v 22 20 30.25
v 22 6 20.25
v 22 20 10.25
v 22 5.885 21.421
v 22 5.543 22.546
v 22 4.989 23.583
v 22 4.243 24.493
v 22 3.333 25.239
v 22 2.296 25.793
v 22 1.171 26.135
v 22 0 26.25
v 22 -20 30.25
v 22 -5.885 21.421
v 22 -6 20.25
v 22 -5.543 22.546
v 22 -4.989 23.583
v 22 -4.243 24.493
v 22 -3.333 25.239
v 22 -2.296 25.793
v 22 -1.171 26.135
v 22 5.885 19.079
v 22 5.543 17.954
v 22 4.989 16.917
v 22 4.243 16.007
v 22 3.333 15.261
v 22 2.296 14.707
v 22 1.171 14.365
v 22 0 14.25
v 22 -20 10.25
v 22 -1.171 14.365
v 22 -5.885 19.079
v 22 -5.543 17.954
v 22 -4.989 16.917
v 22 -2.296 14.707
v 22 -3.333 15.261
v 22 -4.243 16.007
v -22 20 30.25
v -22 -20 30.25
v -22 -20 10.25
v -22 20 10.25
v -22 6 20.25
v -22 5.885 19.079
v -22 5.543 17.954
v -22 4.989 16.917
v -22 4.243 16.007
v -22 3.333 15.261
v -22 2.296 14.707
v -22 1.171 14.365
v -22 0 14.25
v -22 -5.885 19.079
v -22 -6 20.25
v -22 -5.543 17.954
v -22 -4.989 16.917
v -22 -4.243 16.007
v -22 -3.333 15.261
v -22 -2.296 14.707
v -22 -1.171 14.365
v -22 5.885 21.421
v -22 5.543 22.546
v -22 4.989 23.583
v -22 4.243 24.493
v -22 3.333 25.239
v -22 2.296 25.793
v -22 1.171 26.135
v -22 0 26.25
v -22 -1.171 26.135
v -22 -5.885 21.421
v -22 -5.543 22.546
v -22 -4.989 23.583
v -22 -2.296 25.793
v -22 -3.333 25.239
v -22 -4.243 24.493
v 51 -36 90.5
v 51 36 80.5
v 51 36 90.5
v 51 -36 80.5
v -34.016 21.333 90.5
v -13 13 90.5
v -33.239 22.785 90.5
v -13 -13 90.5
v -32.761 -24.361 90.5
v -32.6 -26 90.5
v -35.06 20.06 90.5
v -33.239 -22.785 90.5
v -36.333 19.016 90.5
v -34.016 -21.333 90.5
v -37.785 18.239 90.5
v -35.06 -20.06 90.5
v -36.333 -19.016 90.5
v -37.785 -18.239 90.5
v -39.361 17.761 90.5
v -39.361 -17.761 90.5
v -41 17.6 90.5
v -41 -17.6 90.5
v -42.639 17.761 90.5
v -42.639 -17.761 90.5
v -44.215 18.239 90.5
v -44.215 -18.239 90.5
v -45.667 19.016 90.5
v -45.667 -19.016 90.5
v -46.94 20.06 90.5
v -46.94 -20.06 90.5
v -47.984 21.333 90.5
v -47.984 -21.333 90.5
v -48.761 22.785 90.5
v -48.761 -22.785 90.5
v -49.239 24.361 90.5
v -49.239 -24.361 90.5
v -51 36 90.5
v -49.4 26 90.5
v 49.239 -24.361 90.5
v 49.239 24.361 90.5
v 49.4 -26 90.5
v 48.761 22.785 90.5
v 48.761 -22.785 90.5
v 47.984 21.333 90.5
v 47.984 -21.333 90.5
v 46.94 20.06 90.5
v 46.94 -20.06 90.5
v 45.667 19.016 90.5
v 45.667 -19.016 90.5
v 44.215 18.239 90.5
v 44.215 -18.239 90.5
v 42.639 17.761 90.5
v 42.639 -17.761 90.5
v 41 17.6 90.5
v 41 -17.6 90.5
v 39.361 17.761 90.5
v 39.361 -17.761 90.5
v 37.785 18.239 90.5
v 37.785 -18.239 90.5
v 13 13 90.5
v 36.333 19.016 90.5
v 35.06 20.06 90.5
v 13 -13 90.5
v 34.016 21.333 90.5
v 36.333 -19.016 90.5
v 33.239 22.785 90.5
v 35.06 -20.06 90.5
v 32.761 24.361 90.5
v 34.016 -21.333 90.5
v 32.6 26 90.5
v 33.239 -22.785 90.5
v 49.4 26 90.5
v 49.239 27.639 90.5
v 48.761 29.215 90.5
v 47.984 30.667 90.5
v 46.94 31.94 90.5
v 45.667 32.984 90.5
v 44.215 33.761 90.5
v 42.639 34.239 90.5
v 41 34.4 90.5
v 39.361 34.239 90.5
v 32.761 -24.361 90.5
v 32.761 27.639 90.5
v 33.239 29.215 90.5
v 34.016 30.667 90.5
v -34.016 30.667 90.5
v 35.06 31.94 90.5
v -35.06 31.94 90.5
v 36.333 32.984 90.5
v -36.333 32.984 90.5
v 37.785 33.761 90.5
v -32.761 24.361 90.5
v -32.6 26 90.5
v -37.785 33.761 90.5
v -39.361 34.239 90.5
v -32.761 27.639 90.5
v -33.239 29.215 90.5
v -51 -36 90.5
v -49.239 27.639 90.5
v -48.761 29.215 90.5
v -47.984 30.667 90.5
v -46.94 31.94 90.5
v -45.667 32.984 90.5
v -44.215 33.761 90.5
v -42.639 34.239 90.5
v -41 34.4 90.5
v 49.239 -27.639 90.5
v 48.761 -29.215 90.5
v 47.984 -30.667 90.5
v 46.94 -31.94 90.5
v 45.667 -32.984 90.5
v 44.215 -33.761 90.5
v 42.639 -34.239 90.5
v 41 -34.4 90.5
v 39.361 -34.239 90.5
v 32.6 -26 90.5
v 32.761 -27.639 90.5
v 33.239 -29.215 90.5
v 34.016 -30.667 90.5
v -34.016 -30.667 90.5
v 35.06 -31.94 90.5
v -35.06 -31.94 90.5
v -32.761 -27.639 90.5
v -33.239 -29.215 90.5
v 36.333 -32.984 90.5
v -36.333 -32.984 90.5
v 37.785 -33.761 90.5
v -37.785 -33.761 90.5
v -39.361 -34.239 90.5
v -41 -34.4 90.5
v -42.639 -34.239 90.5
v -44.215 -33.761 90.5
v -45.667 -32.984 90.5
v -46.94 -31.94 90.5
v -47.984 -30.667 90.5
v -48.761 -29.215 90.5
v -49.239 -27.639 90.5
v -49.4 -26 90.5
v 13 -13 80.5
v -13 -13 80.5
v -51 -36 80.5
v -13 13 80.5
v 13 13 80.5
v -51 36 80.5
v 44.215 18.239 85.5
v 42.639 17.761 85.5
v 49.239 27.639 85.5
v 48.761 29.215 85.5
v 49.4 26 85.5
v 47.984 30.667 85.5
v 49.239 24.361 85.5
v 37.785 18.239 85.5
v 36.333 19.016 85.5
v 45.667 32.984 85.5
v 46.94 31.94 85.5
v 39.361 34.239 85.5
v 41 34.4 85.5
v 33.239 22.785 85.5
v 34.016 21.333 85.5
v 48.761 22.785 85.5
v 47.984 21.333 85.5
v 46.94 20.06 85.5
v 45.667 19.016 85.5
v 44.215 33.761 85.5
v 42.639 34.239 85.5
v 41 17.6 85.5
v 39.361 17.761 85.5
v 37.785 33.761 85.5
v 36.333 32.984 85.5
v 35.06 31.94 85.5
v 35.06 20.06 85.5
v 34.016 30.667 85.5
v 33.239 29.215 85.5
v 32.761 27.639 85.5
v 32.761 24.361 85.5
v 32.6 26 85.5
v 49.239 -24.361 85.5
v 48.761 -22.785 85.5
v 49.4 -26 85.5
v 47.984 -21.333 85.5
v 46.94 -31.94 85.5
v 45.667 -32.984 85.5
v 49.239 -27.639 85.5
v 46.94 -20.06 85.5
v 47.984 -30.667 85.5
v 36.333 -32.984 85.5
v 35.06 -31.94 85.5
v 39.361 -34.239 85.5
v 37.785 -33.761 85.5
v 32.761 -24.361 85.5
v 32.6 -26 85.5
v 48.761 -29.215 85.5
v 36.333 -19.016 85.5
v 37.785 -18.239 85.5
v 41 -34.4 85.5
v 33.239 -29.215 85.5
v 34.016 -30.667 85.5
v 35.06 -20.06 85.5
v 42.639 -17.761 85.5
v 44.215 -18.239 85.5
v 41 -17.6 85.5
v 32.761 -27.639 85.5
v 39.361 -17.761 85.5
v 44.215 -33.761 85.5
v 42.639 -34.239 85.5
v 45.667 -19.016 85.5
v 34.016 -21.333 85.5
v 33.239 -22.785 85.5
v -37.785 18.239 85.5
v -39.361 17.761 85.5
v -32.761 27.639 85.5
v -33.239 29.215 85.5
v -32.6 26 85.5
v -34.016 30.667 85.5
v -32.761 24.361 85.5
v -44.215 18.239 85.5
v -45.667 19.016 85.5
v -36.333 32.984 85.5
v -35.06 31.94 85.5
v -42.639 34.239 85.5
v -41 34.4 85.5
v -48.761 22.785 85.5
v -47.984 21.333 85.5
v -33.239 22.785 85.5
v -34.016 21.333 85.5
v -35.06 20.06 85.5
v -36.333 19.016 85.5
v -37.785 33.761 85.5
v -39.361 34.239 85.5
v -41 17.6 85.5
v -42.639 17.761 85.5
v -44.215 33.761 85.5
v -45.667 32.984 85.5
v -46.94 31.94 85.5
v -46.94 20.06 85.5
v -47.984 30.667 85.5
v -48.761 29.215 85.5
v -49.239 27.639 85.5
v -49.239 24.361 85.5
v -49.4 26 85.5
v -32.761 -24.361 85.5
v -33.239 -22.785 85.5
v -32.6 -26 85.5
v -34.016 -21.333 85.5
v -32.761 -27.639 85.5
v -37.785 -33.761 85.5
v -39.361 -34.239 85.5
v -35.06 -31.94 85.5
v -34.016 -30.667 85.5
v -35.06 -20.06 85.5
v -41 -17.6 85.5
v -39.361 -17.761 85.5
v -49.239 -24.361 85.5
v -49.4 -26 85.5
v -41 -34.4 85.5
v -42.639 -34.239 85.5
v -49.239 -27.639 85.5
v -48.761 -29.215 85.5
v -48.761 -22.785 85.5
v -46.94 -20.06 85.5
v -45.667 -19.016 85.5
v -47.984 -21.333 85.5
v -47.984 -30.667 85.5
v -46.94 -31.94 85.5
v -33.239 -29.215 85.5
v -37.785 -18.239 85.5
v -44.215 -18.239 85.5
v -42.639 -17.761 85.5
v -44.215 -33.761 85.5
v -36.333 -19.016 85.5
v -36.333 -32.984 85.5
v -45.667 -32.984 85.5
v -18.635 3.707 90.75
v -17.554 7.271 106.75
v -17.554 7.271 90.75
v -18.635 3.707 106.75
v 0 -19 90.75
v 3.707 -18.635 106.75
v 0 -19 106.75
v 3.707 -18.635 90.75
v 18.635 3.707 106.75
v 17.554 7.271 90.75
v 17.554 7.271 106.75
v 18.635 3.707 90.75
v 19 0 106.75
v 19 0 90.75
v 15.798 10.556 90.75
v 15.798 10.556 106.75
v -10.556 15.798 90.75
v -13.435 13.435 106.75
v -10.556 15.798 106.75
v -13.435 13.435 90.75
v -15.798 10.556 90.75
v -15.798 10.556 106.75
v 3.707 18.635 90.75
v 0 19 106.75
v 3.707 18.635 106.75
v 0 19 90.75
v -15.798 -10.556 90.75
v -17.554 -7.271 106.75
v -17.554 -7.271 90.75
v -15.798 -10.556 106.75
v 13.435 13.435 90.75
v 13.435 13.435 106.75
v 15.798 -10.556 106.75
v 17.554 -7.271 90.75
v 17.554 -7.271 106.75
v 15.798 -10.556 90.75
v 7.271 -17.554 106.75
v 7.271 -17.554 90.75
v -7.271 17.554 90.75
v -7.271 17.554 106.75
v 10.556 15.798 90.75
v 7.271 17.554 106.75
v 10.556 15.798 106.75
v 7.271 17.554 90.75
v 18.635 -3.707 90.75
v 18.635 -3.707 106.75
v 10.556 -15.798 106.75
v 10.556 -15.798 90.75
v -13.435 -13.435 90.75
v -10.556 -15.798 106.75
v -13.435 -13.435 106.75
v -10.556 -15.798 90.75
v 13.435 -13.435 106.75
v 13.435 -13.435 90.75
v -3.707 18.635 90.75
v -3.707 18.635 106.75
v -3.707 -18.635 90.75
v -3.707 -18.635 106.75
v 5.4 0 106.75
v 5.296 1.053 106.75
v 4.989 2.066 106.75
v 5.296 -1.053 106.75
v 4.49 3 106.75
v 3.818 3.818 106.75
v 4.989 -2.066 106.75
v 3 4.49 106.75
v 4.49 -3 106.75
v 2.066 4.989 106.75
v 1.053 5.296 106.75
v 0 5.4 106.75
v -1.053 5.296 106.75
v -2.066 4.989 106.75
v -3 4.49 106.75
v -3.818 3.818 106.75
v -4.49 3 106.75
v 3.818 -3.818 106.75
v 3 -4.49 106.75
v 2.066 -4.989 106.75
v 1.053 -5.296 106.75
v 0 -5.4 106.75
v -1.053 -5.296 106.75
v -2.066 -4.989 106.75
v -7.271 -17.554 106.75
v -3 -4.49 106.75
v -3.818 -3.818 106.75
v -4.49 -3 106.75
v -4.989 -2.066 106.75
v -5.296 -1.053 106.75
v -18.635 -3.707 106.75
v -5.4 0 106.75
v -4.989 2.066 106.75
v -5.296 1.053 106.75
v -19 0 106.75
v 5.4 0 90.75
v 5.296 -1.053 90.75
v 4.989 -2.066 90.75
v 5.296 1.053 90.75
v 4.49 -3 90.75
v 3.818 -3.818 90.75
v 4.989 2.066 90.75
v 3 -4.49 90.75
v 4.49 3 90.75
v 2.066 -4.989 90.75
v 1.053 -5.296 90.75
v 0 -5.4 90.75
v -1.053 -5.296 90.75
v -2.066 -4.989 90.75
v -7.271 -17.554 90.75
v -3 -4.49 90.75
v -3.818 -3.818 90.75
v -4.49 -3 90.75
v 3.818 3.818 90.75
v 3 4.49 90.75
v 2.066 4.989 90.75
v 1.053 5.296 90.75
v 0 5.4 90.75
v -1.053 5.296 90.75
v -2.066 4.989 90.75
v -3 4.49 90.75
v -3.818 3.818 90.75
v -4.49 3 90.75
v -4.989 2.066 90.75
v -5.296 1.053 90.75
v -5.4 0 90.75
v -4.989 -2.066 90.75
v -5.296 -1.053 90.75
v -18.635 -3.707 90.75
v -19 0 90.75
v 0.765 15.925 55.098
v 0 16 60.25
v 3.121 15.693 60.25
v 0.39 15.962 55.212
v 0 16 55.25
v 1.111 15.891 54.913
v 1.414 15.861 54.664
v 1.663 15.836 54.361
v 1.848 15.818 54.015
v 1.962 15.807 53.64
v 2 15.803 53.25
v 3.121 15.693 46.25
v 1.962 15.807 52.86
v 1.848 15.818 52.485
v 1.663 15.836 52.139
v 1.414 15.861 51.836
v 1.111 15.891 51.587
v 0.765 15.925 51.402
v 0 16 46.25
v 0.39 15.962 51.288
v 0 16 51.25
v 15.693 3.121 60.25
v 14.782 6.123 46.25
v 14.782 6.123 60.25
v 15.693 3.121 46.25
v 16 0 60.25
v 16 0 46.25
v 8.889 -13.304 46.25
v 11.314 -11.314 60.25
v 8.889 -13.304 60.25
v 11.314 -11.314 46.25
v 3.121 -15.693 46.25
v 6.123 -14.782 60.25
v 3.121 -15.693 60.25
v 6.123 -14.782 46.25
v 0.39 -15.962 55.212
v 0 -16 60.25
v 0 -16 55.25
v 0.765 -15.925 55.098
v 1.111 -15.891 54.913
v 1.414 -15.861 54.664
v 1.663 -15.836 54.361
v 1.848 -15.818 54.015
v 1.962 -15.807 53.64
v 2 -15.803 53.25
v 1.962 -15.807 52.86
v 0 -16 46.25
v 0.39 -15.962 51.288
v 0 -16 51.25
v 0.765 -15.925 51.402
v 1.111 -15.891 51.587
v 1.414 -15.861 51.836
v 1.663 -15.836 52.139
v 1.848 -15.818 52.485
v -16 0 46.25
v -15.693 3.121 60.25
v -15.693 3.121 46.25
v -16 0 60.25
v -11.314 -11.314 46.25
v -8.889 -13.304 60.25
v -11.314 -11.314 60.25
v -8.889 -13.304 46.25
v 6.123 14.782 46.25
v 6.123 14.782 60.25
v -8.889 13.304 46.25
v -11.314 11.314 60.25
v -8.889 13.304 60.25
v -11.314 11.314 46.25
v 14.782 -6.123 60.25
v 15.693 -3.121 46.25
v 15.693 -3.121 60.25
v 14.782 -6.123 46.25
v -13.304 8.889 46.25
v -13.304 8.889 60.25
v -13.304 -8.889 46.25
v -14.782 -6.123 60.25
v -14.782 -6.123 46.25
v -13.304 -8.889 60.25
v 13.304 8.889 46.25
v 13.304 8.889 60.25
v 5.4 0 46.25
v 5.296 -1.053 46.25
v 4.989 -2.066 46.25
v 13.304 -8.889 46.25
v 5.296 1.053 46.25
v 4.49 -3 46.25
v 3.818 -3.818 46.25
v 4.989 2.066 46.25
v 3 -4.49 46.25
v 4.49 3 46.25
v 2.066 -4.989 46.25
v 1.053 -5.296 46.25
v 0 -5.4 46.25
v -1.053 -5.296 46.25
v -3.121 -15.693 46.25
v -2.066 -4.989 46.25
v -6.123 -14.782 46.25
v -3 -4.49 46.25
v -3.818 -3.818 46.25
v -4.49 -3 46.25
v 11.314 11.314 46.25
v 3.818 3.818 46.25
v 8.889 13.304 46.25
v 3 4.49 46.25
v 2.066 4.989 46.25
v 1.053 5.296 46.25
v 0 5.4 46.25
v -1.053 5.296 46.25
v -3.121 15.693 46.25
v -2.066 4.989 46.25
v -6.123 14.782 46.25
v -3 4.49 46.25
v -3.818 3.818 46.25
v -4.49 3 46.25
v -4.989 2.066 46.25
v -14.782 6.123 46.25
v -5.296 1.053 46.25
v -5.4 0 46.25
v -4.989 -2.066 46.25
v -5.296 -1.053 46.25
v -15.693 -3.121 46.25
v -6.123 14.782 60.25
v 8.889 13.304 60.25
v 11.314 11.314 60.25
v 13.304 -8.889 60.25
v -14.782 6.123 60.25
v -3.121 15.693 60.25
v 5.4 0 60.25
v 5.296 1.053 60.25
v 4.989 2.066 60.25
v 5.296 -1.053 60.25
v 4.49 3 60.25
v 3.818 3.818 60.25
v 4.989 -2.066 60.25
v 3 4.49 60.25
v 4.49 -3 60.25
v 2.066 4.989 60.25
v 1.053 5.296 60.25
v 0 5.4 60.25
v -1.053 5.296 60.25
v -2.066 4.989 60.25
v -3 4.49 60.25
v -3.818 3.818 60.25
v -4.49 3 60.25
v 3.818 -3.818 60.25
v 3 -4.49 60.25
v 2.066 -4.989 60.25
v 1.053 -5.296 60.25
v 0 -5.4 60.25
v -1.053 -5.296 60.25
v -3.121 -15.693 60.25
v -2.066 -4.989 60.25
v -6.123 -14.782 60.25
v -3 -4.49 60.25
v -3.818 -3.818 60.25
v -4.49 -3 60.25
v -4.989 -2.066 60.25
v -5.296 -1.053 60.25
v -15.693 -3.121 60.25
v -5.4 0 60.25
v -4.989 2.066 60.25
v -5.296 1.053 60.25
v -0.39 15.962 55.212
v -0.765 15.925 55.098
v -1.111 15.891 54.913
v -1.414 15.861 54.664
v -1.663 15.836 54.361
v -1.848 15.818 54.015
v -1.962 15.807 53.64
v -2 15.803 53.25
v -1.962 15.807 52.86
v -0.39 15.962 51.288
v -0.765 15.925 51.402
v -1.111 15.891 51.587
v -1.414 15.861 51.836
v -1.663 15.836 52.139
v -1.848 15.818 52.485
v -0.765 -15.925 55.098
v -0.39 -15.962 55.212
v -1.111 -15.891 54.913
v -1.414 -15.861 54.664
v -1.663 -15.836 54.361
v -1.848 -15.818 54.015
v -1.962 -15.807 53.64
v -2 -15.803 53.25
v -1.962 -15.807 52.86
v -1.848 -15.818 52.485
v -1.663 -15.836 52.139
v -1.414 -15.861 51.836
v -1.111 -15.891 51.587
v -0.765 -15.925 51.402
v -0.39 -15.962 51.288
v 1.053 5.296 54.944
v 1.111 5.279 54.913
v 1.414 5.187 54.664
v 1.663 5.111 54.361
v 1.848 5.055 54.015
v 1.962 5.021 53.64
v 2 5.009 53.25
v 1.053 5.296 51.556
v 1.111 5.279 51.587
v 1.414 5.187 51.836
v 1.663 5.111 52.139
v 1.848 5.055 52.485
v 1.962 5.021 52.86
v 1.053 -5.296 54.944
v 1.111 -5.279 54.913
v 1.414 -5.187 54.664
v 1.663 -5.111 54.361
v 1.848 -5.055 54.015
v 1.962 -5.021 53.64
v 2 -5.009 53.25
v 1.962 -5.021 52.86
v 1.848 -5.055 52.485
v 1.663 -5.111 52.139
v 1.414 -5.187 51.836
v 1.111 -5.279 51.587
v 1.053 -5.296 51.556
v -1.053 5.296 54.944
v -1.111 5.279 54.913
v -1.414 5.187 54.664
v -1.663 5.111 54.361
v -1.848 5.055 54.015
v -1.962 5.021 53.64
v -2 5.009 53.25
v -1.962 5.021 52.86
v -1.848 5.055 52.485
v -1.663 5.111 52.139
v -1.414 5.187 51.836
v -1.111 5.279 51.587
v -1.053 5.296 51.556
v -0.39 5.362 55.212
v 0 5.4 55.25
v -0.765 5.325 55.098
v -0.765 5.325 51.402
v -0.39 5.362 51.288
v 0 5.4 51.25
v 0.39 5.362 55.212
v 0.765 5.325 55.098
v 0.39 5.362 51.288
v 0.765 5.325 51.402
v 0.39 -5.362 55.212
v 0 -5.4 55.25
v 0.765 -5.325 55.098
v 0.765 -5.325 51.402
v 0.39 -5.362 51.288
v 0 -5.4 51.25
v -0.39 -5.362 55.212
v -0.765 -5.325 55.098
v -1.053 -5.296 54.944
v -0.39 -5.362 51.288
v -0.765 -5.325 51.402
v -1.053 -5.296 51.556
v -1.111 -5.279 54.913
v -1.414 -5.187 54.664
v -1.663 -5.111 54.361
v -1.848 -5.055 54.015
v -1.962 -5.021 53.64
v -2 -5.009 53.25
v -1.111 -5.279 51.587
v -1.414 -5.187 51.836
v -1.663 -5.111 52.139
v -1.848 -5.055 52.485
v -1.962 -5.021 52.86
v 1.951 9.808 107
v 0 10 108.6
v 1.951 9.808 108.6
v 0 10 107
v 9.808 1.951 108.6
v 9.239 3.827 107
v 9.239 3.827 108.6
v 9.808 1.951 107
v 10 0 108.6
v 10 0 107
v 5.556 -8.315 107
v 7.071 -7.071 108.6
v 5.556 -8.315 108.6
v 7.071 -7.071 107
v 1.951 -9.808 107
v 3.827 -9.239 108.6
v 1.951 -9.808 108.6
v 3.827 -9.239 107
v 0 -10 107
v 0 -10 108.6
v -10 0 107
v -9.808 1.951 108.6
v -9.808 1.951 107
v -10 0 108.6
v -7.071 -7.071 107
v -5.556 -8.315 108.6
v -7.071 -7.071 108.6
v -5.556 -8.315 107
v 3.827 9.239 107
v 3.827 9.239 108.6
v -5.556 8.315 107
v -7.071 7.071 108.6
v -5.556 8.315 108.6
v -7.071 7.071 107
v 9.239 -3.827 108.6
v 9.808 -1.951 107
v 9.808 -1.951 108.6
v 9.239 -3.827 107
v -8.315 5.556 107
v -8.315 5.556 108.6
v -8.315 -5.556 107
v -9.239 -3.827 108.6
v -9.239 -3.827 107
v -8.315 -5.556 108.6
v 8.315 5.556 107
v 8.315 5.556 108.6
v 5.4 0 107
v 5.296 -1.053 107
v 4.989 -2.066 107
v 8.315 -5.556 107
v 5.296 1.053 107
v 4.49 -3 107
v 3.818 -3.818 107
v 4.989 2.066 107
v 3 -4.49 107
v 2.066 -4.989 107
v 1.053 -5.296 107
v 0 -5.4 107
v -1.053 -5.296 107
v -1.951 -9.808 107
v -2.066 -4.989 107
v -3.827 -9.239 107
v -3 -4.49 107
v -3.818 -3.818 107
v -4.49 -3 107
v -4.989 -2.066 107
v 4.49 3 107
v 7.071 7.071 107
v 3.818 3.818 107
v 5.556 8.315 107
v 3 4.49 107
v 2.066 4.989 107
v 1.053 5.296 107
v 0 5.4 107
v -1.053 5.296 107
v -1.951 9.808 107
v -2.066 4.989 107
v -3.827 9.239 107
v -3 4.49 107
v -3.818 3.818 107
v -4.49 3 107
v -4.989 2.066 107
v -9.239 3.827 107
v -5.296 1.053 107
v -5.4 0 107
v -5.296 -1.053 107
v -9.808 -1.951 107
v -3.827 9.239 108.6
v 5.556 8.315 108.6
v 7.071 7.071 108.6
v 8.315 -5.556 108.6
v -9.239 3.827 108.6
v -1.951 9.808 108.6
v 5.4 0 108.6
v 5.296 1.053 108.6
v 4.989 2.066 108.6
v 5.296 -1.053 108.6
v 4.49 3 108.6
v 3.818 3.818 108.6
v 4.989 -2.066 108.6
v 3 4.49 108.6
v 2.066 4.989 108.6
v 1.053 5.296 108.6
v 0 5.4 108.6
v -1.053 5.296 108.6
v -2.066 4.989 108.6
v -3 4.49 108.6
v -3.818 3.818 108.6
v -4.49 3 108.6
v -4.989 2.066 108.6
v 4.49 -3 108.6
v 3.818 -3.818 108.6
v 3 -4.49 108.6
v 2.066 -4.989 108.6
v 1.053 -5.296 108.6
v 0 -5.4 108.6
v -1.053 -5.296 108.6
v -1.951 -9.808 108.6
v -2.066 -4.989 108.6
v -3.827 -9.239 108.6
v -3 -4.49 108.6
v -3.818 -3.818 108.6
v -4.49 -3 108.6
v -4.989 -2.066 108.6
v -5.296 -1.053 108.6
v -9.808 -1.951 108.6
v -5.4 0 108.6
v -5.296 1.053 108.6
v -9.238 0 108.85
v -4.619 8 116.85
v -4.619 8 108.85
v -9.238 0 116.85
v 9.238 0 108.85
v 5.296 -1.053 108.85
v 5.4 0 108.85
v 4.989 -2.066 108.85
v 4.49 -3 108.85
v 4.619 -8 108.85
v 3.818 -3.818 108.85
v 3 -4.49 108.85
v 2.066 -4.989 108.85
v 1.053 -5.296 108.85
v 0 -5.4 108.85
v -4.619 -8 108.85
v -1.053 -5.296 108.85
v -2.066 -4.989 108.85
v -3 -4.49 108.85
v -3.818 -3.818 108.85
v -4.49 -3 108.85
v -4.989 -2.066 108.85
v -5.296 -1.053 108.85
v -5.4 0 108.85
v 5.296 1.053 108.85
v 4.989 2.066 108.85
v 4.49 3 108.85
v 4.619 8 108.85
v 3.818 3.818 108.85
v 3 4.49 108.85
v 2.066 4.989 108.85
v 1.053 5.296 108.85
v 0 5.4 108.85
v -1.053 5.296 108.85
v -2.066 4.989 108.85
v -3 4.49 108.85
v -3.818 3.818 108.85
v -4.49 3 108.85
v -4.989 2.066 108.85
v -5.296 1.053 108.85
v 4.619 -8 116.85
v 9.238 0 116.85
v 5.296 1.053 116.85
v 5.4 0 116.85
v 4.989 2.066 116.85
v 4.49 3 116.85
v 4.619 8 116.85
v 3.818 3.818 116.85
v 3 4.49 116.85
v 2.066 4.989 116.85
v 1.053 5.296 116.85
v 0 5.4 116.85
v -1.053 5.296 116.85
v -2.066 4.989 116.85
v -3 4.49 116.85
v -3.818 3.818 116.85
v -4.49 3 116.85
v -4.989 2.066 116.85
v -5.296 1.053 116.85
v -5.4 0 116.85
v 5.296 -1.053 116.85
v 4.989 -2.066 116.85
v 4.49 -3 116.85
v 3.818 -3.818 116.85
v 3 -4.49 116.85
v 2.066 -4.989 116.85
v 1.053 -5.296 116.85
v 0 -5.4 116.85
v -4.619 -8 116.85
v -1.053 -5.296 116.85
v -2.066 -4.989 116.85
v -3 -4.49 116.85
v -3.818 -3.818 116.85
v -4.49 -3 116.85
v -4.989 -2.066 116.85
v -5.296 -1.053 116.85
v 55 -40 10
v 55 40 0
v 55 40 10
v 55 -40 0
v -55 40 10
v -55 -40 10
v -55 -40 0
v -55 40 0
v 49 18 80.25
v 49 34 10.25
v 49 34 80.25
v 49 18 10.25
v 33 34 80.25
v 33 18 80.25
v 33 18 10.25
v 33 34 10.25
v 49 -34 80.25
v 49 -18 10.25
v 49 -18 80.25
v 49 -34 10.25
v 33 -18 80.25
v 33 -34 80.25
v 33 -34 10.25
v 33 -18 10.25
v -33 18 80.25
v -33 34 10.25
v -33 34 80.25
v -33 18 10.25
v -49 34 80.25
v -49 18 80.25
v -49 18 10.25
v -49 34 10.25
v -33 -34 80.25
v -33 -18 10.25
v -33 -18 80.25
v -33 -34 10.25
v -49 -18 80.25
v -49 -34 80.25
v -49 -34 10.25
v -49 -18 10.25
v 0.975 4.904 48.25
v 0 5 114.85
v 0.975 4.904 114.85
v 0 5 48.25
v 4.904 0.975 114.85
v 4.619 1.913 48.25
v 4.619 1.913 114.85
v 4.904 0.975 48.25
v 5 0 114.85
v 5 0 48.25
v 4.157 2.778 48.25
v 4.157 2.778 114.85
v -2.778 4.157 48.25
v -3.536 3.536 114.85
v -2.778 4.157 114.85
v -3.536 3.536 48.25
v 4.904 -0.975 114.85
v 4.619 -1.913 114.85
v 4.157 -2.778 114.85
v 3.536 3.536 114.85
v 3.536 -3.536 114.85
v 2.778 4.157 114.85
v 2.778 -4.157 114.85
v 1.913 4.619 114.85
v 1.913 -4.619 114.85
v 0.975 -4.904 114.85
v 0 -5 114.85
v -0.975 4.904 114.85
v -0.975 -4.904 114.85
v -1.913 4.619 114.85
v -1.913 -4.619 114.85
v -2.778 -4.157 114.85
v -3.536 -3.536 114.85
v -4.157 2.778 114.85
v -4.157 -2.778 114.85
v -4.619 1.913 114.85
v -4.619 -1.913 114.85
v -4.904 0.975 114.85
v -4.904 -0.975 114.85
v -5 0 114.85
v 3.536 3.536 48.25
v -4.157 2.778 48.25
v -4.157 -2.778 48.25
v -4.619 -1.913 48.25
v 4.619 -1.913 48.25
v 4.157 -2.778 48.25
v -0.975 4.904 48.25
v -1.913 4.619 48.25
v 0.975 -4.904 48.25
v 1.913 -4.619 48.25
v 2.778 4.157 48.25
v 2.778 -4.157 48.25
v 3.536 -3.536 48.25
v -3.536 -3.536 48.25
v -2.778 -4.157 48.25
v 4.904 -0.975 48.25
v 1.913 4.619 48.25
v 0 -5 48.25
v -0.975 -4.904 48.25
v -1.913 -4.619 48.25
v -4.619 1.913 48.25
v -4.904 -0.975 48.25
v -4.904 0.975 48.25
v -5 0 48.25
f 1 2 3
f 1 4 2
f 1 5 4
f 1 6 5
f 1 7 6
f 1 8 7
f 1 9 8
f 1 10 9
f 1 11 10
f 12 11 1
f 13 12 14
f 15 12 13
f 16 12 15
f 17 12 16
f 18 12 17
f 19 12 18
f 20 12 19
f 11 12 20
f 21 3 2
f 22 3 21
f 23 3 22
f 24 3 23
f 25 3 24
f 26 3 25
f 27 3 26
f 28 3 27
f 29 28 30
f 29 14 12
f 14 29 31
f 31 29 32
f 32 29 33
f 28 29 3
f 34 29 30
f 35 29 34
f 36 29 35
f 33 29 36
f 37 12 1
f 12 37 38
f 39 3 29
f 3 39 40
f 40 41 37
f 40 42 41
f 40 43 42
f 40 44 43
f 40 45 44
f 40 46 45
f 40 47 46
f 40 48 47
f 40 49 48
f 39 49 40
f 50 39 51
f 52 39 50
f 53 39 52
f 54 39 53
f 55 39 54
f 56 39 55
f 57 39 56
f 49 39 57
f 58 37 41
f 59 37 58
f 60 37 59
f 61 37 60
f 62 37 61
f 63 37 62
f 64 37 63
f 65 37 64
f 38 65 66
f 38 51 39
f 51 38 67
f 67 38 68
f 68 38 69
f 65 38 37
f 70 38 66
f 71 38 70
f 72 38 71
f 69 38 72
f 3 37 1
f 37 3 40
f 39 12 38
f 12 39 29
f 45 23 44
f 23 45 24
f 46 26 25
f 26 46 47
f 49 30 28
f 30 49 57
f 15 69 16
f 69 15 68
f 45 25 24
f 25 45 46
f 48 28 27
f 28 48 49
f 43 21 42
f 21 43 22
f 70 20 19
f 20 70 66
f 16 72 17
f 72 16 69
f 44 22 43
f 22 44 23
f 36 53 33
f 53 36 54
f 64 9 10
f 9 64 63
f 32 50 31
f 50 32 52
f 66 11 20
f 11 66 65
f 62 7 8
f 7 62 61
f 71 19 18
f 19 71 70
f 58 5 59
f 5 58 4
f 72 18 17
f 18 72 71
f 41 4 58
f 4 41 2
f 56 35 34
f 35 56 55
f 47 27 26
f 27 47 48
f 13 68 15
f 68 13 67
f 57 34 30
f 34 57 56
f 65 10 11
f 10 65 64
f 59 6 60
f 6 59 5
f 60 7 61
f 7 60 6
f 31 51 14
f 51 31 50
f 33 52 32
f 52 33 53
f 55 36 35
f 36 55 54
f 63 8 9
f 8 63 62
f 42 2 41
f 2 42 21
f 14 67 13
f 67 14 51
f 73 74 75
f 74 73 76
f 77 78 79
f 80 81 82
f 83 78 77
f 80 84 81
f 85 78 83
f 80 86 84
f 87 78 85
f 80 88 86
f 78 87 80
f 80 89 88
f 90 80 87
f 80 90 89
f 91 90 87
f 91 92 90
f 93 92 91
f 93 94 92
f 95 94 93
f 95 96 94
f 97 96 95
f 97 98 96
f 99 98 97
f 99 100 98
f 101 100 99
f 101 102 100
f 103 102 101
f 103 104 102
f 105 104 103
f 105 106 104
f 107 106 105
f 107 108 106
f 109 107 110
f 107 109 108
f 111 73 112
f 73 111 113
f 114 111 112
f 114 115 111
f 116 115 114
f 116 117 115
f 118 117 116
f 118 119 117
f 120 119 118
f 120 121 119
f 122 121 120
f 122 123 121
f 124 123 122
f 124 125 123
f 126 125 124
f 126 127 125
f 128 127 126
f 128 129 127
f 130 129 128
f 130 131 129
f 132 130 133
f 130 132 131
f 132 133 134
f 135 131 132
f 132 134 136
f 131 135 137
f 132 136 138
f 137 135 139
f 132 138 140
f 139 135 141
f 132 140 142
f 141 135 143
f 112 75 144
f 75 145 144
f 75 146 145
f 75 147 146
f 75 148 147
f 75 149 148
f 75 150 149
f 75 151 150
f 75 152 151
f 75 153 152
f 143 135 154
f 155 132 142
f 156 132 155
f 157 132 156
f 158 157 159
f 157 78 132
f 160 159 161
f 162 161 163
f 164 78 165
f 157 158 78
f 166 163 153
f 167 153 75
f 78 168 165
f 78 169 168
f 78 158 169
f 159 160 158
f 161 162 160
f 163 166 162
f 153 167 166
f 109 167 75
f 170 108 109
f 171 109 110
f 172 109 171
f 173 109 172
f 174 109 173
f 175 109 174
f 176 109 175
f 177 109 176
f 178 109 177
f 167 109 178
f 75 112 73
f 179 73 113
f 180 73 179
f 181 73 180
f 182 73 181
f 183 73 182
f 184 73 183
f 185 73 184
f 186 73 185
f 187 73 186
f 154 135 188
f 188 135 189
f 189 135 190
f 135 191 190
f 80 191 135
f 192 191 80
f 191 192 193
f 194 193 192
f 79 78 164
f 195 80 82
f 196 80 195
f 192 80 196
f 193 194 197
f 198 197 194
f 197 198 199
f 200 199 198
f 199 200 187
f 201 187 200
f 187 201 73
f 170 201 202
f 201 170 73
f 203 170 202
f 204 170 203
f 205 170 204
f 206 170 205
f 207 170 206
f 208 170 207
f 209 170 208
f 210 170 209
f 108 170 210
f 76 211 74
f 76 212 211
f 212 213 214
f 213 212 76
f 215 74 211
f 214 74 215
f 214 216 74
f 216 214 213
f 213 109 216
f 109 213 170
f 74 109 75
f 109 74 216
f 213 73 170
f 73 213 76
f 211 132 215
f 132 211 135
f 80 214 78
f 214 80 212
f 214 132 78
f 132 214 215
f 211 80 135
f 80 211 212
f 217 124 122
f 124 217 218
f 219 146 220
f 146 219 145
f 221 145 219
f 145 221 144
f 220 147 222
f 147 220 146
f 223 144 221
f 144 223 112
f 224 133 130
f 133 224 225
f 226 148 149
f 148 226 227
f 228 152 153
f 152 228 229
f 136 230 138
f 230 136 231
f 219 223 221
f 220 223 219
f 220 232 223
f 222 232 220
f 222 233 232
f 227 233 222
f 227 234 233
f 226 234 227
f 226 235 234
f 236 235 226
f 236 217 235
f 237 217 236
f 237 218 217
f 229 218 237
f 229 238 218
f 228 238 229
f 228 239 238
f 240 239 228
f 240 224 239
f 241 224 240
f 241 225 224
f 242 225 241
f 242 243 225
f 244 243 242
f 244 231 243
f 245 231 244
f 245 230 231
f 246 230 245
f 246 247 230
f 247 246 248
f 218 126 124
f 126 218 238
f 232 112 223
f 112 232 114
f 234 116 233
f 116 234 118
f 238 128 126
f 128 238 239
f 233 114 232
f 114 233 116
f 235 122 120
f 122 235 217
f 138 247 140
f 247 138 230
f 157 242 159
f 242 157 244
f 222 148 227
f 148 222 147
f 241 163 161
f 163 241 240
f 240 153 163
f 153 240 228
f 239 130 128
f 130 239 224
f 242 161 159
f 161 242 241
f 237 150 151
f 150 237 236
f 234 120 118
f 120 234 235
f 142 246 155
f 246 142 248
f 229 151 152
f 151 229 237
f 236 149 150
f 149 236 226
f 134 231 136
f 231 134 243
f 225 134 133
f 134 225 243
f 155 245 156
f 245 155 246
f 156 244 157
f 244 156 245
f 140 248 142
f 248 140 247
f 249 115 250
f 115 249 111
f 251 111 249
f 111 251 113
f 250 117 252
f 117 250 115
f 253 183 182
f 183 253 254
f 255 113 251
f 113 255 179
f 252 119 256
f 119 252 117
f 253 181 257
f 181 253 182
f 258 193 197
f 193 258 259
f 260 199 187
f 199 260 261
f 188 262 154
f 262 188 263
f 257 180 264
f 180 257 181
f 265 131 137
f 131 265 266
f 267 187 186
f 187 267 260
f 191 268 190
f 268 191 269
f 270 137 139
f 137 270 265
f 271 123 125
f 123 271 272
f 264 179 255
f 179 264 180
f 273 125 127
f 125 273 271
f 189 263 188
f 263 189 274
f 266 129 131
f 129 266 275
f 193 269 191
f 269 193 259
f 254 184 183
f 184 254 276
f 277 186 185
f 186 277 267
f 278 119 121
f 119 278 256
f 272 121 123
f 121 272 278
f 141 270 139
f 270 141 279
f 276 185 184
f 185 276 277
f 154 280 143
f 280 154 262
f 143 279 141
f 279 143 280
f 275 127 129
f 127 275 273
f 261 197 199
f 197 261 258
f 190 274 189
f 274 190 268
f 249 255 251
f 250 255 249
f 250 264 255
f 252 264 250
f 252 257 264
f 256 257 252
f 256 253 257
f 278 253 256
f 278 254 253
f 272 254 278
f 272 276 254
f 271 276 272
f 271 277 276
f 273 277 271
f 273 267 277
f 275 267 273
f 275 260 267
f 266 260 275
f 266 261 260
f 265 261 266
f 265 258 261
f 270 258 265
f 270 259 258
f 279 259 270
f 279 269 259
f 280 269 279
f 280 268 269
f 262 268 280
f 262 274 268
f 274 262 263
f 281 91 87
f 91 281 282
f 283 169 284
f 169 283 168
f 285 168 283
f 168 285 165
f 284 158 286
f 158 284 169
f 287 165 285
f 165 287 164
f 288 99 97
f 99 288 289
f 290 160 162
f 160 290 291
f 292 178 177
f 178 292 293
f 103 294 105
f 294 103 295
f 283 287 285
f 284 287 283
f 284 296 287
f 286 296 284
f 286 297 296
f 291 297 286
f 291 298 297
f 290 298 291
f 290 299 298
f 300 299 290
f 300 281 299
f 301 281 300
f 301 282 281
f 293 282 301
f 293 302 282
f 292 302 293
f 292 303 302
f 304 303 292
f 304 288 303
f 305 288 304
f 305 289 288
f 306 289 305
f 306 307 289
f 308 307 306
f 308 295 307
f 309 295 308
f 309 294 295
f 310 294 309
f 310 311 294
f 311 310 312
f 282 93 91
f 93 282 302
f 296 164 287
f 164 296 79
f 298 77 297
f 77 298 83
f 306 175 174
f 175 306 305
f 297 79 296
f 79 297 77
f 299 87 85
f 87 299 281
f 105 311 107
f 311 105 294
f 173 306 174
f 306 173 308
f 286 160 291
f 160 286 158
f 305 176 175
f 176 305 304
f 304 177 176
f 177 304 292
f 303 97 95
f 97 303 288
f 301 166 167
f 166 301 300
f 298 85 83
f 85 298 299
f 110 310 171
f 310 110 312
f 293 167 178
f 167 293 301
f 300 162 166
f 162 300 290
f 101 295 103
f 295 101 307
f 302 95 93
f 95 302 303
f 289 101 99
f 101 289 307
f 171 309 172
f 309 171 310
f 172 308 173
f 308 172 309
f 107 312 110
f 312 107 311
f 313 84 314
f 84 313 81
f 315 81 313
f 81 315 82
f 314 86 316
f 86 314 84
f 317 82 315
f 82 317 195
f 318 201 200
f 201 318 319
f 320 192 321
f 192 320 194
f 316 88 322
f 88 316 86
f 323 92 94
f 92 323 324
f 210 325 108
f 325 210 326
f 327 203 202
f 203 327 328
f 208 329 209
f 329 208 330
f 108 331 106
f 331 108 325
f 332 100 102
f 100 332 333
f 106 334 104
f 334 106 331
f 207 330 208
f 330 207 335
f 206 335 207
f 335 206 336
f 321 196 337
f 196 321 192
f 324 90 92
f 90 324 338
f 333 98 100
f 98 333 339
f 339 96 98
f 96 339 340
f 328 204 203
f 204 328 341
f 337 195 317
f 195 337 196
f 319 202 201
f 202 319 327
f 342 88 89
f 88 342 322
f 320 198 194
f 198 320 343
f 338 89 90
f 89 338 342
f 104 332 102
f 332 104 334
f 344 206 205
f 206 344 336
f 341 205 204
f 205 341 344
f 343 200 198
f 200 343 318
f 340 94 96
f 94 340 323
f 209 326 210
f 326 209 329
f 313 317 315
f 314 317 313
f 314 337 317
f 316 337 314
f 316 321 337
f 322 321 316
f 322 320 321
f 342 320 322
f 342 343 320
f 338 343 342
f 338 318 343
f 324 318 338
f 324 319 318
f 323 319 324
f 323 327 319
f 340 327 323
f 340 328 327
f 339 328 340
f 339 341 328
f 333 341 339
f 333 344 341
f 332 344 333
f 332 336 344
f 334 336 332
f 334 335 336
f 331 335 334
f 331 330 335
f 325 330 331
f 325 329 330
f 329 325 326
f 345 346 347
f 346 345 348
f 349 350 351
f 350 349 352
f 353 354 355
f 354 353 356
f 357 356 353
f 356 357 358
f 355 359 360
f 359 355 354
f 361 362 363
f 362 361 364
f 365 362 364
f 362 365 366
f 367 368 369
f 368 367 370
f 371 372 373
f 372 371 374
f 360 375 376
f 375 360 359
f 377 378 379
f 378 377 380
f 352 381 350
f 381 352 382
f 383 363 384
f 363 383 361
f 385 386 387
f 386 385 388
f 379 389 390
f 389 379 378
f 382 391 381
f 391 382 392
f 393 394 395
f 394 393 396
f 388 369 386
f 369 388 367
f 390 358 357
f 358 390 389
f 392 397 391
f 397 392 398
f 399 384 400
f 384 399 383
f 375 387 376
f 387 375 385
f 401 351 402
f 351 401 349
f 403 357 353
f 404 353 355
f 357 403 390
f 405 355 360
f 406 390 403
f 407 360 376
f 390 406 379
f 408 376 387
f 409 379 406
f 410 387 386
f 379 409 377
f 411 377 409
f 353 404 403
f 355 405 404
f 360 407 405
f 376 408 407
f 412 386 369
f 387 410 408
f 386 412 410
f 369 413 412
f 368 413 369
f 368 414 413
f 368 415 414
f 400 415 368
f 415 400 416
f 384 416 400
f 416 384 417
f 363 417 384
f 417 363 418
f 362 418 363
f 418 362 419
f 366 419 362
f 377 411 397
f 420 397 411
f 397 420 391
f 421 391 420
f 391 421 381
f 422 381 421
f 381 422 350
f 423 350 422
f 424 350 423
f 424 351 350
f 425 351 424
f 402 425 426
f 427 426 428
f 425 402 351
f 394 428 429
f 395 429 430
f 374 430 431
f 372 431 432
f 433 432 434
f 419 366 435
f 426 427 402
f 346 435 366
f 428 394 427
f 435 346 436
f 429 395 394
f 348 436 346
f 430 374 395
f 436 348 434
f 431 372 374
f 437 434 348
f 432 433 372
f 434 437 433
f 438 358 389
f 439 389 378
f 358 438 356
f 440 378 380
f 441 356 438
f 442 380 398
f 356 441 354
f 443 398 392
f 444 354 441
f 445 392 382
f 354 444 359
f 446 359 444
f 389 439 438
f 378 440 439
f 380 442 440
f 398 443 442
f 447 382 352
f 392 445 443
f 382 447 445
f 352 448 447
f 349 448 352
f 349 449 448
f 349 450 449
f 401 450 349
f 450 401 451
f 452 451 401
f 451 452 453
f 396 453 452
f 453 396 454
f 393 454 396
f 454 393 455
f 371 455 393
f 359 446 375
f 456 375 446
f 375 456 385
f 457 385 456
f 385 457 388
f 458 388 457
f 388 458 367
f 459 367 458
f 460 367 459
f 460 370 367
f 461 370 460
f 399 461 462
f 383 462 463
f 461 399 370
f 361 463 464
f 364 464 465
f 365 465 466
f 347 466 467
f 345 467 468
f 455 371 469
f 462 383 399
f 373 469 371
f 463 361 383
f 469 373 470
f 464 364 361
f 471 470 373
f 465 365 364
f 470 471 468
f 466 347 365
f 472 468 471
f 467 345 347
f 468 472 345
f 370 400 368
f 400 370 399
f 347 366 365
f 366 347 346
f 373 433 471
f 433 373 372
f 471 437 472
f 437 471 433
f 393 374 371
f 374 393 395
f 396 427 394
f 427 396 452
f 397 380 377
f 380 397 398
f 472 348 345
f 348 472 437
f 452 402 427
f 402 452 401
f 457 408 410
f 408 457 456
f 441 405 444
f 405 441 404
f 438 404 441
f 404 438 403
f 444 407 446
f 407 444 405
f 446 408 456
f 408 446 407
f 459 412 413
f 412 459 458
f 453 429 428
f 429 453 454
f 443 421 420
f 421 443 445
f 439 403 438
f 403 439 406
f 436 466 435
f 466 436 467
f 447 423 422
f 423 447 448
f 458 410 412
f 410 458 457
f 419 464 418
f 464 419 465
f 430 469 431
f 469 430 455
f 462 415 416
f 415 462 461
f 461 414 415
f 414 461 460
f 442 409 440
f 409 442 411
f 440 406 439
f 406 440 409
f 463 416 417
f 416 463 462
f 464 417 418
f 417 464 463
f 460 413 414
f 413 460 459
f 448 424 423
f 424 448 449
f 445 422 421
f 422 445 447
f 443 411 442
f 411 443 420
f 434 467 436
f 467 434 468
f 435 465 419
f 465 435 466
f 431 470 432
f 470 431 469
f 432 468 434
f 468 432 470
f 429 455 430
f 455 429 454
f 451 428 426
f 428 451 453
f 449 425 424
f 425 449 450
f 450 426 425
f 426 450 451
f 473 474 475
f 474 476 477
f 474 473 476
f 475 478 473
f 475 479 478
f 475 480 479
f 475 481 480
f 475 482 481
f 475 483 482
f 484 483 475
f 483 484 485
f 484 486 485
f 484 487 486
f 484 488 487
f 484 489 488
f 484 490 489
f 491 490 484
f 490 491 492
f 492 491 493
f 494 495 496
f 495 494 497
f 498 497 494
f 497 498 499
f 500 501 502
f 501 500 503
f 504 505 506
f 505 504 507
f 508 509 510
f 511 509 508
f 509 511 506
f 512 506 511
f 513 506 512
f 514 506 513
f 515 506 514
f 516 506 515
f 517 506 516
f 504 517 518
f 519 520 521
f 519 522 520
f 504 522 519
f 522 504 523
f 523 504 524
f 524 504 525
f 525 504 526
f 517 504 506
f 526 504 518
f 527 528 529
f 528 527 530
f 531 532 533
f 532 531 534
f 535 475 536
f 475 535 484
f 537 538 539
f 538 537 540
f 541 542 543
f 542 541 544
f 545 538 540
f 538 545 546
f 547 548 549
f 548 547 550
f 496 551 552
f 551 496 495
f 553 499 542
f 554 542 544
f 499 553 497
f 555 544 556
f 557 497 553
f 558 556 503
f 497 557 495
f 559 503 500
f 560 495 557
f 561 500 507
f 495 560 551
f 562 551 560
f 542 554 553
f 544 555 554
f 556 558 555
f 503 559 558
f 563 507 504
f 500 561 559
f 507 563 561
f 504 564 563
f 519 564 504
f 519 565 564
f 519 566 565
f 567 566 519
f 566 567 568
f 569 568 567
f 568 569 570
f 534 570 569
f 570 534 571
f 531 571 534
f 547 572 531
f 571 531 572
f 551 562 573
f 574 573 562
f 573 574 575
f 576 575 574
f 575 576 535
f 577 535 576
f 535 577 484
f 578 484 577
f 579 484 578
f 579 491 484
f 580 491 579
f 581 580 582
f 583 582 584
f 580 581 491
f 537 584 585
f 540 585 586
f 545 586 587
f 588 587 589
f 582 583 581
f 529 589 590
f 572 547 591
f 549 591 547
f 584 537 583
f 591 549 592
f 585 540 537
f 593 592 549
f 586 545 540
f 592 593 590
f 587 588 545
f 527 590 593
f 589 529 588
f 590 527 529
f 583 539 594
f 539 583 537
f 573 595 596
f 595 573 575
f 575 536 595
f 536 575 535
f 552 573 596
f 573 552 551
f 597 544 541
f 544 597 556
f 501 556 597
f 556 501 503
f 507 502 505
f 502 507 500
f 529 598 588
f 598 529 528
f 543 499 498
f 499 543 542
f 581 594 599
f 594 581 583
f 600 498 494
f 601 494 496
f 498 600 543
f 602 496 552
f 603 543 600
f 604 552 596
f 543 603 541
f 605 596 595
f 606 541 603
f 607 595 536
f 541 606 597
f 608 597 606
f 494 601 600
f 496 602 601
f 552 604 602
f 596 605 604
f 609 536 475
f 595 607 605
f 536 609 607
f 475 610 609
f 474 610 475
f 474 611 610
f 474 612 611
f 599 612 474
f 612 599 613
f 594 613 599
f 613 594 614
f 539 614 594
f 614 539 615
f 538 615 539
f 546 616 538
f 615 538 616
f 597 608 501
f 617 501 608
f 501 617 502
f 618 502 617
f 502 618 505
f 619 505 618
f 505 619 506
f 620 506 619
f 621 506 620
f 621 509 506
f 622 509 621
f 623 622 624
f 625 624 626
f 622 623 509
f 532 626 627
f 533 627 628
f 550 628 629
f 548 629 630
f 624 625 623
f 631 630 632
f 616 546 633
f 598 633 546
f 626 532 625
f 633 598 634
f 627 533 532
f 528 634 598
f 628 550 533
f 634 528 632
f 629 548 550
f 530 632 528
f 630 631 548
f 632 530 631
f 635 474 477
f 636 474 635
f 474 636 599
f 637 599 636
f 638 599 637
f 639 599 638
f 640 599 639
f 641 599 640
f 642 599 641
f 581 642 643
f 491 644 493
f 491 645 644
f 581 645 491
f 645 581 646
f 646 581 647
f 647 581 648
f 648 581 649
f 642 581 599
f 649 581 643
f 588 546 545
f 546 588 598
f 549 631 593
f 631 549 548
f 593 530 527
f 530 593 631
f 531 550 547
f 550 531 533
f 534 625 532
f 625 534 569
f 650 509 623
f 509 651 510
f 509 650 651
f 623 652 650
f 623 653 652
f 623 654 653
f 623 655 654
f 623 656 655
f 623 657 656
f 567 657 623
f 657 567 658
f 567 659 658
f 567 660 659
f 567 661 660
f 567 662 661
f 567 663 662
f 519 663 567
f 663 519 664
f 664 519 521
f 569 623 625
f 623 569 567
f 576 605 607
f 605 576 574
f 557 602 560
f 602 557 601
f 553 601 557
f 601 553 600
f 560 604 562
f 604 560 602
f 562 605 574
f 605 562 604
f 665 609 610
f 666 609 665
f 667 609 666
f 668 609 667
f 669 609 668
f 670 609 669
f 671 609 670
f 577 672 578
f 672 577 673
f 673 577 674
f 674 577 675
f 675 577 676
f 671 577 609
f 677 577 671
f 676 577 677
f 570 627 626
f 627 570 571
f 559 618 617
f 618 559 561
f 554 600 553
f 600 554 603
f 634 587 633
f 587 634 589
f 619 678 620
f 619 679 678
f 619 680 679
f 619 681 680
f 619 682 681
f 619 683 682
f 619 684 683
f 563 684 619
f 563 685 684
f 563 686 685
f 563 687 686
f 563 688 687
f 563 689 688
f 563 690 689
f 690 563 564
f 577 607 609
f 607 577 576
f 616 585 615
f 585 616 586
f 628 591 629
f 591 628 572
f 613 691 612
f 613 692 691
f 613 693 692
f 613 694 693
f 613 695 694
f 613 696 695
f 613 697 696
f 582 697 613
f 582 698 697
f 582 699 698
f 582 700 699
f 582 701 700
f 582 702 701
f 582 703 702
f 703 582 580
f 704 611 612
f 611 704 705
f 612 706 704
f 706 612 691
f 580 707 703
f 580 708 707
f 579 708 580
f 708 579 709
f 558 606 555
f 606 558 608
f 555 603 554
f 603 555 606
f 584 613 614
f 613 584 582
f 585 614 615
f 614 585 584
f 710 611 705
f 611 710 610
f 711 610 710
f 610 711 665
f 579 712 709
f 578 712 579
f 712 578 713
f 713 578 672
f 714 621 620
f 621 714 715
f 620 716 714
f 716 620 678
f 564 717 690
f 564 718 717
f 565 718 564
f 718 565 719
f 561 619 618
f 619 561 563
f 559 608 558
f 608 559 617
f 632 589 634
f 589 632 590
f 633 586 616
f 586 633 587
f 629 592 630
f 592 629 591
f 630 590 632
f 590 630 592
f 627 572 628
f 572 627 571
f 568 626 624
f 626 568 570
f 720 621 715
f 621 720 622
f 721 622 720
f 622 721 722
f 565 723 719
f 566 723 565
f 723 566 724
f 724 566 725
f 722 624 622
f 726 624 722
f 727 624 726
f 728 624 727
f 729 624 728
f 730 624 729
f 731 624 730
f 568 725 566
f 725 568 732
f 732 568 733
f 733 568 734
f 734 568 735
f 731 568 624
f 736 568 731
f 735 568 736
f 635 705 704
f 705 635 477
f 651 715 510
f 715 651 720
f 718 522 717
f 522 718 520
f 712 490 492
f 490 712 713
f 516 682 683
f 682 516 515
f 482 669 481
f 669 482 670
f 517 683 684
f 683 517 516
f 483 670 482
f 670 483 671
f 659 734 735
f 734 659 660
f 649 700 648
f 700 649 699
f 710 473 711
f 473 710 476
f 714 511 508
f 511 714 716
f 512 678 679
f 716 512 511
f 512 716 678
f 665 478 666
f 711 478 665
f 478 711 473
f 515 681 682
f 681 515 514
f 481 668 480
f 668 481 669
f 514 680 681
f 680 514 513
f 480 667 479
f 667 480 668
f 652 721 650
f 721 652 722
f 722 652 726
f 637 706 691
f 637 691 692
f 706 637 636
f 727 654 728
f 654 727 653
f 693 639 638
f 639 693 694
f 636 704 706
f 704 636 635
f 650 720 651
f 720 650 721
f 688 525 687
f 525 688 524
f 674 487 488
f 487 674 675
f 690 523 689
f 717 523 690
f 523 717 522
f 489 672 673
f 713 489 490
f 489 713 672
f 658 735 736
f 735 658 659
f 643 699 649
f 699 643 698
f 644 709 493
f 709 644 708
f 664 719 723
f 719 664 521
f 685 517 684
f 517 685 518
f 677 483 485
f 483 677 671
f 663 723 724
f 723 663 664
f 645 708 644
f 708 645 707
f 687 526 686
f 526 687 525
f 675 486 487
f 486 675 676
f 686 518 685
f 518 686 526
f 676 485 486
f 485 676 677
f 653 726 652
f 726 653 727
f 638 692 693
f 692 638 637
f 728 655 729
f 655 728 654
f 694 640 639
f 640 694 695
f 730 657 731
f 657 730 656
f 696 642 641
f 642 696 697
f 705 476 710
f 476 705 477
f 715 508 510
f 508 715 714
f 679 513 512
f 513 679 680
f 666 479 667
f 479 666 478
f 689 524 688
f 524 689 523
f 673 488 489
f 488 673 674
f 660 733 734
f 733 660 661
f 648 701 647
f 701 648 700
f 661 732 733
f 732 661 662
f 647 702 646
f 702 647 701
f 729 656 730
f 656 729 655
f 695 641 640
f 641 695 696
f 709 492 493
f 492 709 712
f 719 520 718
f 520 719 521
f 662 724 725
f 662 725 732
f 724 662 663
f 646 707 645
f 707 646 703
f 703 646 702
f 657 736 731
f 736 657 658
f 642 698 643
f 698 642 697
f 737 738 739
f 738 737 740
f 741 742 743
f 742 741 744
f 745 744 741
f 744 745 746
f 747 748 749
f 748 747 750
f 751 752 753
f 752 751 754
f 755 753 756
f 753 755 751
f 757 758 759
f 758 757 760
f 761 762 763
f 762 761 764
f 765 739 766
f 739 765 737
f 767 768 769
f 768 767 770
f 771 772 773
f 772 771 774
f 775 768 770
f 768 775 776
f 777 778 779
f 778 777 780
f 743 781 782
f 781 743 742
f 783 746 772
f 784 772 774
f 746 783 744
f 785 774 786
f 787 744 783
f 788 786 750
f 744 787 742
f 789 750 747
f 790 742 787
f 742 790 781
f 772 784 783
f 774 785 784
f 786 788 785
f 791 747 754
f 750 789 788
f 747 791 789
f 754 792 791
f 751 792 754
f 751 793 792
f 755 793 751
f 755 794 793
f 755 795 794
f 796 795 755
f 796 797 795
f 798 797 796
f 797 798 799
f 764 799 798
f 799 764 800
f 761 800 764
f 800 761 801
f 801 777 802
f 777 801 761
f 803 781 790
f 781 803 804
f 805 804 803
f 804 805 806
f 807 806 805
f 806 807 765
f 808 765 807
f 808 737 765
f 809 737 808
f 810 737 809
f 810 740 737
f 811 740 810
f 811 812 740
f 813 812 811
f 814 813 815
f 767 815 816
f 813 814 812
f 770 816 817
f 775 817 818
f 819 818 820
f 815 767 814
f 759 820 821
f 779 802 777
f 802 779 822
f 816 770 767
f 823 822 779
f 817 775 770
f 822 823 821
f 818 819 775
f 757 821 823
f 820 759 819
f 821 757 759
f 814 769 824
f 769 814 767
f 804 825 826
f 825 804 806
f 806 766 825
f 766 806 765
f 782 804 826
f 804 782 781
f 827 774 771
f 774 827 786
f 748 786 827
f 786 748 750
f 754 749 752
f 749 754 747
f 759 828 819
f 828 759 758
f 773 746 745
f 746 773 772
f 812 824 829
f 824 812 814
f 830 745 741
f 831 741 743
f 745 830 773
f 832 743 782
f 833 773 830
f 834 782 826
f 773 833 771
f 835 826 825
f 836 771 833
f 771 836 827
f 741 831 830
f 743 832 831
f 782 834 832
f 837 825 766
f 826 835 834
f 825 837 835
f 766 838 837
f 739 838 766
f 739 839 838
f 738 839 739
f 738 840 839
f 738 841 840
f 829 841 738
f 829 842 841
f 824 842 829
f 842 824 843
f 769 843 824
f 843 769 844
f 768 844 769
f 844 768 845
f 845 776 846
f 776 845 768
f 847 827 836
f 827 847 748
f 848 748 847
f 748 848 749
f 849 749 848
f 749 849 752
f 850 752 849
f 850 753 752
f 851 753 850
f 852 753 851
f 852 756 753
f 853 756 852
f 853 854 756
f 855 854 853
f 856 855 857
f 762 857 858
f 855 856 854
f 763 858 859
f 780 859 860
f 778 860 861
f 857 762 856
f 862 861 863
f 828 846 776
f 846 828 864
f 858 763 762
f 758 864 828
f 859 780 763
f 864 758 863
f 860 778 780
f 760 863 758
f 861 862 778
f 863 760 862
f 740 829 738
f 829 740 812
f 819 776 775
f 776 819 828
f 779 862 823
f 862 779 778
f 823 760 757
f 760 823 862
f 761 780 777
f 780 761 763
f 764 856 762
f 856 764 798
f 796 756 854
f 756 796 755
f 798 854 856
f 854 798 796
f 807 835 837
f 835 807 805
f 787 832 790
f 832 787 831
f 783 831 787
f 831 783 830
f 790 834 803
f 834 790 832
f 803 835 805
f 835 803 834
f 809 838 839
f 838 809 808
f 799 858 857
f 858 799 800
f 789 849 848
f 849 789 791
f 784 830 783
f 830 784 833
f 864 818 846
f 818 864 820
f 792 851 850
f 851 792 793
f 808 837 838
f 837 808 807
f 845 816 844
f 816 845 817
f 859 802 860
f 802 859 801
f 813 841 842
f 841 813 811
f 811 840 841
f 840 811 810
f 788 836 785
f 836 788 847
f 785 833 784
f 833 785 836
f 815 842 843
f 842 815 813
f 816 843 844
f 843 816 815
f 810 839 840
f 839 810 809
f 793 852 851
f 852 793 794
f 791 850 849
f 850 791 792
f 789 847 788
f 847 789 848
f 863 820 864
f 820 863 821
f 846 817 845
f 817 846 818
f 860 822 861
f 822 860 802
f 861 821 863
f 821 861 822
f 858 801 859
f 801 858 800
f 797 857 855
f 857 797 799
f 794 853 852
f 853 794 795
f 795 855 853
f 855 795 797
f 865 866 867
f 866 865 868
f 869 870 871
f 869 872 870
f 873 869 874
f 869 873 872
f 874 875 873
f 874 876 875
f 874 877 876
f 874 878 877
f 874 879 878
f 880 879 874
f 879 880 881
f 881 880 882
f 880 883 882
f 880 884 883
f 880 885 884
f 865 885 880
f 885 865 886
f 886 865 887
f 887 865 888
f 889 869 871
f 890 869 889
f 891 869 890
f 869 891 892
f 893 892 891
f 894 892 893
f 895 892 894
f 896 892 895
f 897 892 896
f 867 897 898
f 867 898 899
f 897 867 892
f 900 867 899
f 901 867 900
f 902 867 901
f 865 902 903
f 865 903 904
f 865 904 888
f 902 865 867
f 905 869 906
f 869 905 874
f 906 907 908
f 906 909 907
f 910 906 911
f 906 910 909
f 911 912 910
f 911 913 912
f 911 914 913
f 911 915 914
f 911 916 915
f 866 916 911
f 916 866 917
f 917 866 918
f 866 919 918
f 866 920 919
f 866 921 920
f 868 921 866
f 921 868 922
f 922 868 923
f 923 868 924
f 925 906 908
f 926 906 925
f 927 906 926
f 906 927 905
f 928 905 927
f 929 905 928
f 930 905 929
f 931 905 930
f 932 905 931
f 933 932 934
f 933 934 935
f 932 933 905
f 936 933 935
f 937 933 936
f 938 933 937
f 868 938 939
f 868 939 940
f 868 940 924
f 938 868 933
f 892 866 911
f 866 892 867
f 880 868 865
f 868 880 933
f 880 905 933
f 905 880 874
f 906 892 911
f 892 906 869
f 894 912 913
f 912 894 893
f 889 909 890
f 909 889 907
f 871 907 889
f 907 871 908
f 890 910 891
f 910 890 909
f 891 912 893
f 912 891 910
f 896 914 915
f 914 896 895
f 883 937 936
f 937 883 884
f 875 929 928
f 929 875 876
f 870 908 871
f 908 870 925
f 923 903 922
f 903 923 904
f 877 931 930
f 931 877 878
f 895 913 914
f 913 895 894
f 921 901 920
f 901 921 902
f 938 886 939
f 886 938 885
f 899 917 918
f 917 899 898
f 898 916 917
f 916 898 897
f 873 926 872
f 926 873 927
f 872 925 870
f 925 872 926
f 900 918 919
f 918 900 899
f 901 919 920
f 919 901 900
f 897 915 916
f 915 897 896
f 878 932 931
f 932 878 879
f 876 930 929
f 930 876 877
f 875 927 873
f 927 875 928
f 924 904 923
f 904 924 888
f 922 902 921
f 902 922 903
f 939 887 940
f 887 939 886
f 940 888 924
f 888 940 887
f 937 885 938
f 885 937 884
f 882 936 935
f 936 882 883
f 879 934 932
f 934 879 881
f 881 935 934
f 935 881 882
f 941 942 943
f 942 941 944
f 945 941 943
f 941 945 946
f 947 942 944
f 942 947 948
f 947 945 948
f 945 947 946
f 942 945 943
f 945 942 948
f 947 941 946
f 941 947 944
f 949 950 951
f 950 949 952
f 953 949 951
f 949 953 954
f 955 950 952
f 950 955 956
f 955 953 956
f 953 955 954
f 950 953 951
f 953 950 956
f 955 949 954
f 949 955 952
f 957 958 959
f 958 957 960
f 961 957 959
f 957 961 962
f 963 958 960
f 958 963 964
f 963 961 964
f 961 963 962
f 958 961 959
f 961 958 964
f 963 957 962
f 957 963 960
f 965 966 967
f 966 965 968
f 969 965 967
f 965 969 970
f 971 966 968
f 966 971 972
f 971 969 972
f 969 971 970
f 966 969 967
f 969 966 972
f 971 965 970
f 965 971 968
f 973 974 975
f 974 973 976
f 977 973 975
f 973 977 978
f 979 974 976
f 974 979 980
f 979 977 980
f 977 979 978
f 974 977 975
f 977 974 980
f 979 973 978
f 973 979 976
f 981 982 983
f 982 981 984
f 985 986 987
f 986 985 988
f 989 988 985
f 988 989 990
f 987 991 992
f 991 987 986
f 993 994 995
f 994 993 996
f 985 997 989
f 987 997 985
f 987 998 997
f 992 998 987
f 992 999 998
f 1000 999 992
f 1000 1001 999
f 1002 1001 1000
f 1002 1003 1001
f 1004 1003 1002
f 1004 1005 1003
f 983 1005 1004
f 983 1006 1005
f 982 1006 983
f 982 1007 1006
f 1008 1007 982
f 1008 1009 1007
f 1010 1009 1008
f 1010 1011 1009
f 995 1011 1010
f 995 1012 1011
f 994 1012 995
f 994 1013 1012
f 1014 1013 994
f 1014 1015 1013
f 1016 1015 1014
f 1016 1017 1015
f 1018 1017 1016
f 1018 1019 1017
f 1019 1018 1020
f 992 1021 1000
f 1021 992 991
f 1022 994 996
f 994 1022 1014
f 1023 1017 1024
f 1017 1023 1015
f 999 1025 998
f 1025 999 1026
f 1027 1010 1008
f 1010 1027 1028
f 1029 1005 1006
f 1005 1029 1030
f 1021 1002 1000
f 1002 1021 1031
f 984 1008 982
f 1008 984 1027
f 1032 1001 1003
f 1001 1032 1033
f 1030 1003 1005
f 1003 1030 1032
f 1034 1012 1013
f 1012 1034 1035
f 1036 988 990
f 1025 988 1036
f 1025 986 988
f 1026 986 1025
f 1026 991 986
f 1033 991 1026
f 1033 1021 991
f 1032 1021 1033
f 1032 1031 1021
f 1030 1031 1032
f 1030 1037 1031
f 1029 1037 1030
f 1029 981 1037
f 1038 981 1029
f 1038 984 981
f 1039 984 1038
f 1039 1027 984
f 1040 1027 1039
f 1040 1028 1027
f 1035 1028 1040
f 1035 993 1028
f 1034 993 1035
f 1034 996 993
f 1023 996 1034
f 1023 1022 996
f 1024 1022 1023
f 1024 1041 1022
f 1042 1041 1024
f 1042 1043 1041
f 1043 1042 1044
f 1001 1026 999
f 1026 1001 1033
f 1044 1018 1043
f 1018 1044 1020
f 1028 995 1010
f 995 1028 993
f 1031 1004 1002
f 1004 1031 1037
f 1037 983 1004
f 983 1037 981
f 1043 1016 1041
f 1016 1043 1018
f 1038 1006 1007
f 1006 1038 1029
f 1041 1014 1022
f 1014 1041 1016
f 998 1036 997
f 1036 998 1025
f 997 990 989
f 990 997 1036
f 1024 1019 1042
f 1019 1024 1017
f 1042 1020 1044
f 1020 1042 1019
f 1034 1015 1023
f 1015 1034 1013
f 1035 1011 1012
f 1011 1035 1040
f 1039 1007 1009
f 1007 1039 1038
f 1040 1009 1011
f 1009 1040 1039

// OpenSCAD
$fn = 32;

// ------------------------------------------------------------------------
// Arbor press fixture: screw d10, posts 70 mm, gap 16 mm
// Every part is its own module, assembly() places every instance.
// ------------------------------------------------------------------------

// --- part 1 ---
module press_bed() {
  difference() {
    translate([-55, -40, 0]) cube([110, 80, 10]);
  }
}

// --- part 2 ---
module anvil_block() {
  difference() {
    translate([-22, -20, 0]) cube([44, 40, 20]);
    translate([0, 0, 10]) rotate([0, 90, 0]) cylinder(h = 46, d = 12, center = true);
  }
}

// --- part 3 ---
module press_post_a() {
  translate([-8, -8, 0]) cube([16, 16, 70]);
}

// --- part 4 ---
module press_post_b() {
  translate([-8, -8, 0]) cube([16, 16, 70]);
}

// --- part 5 ---
module press_post_c() {
  translate([-8, -8, 0]) cube([16, 16, 70]);
}

// --- part 6 ---
module press_post_d() {
  translate([-8, -8, 0]) cube([16, 16, 70]);
}

// --- part 7 ---
module press_frame() {
  difference() {
    translate([-51, -36, 0]) cube([102, 72, 10]);
    translate([-13, -13, -1]) cube([26, 26, 12]);
    translate([41, 26, 5]) cylinder(h = 6, d = 16.8);
    translate([41, -26, 5]) cylinder(h = 6, d = 16.8);
    translate([-41, 26, 5]) cylinder(h = 6, d = 16.8);
    translate([-41, -26, 5]) cylinder(h = 6, d = 16.8);
  }
}

// --- part 8 ---
module guide_ring() {
  difference() {
      translate([0, 0, 0]) cylinder(h = 16, d = 38);
      translate([0, 0, -1]) cylinder(h = 18, d = 10.8);
    }
}

// --- part 9 ---
module press_screw() {
  translate([0, 0, -33.3]) cylinder(h = 66.6, d = 10);
}

// --- part 10 ---
module press_head() {
  difference() {
    cylinder(h = 14, d = 32);
    translate([0, 0, -1]) cylinder(h = 16, d = 10.8);
    translate([0, 0, 7]) rotate([90, 0, 0]) cylinder(h = 34, d = 4, center = true);
  }
}

// --- part 11 ---
module nut_washer() {
  difference() {
      translate([0, 0, 0]) cylinder(h = 1.6, d = 20);
      translate([0, 0, -1]) cylinder(h = 3.6, d = 10.8);
    }
}

// --- part 12 ---
module press_nut() {
  difference() {
    linear_extrude(height = 8) polygon(points = [[9.238, 0], [4.619, 8], [-4.619, 8], [-9.238, 0], [-4.619, -8], [4.619, -8]]);
    translate([0, 0, -1]) cylinder(h = 10, d = 10.8);
  }
}

// --- assembly ---
module assembly() {
  color([0.80, 0.24, 0.20]) translate([0, 0, 0]) rotate([0, 0, 0]) press_bed();
  color([0.20, 0.45, 0.75]) translate([0, 0, 10.25]) rotate([0, 0, 0]) anvil_block();
  color([0.25, 0.62, 0.32]) translate([41, 26, 10.25]) rotate([0, 0, 0]) press_post_a();
  color([0.92, 0.70, 0.18]) translate([41, -26, 10.25]) rotate([0, 0, 0]) press_post_b();
  color([0.58, 0.35, 0.70]) translate([-41, 26, 10.25]) rotate([0, 0, 0]) press_post_c();
  color([0.16, 0.66, 0.66]) translate([-41, -26, 10.25]) rotate([0, 0, 0]) press_post_d();
  color([0.85, 0.48, 0.18]) translate([0, 0, 80.5]) rotate([0, 0, 0]) press_frame();
  color([0.55, 0.60, 0.65]) translate([0, 0, 90.75]) rotate([0, 0, 0]) guide_ring();
  color([0.75, 0.30, 0.55]) translate([0, 0, 81.55]) rotate([0, 0, 0]) press_screw();
  color([0.42, 0.52, 0.28]) translate([0, 0, 46.25]) rotate([0, 0, 0]) press_head();
  color([0.80, 0.24, 0.20]) translate([0, 0, 107]) rotate([0, 0, 0]) nut_washer();
  color([0.20, 0.45, 0.75]) translate([0, 0, 108.85]) rotate([0, 0, 0]) press_nut();
}

assembly();
